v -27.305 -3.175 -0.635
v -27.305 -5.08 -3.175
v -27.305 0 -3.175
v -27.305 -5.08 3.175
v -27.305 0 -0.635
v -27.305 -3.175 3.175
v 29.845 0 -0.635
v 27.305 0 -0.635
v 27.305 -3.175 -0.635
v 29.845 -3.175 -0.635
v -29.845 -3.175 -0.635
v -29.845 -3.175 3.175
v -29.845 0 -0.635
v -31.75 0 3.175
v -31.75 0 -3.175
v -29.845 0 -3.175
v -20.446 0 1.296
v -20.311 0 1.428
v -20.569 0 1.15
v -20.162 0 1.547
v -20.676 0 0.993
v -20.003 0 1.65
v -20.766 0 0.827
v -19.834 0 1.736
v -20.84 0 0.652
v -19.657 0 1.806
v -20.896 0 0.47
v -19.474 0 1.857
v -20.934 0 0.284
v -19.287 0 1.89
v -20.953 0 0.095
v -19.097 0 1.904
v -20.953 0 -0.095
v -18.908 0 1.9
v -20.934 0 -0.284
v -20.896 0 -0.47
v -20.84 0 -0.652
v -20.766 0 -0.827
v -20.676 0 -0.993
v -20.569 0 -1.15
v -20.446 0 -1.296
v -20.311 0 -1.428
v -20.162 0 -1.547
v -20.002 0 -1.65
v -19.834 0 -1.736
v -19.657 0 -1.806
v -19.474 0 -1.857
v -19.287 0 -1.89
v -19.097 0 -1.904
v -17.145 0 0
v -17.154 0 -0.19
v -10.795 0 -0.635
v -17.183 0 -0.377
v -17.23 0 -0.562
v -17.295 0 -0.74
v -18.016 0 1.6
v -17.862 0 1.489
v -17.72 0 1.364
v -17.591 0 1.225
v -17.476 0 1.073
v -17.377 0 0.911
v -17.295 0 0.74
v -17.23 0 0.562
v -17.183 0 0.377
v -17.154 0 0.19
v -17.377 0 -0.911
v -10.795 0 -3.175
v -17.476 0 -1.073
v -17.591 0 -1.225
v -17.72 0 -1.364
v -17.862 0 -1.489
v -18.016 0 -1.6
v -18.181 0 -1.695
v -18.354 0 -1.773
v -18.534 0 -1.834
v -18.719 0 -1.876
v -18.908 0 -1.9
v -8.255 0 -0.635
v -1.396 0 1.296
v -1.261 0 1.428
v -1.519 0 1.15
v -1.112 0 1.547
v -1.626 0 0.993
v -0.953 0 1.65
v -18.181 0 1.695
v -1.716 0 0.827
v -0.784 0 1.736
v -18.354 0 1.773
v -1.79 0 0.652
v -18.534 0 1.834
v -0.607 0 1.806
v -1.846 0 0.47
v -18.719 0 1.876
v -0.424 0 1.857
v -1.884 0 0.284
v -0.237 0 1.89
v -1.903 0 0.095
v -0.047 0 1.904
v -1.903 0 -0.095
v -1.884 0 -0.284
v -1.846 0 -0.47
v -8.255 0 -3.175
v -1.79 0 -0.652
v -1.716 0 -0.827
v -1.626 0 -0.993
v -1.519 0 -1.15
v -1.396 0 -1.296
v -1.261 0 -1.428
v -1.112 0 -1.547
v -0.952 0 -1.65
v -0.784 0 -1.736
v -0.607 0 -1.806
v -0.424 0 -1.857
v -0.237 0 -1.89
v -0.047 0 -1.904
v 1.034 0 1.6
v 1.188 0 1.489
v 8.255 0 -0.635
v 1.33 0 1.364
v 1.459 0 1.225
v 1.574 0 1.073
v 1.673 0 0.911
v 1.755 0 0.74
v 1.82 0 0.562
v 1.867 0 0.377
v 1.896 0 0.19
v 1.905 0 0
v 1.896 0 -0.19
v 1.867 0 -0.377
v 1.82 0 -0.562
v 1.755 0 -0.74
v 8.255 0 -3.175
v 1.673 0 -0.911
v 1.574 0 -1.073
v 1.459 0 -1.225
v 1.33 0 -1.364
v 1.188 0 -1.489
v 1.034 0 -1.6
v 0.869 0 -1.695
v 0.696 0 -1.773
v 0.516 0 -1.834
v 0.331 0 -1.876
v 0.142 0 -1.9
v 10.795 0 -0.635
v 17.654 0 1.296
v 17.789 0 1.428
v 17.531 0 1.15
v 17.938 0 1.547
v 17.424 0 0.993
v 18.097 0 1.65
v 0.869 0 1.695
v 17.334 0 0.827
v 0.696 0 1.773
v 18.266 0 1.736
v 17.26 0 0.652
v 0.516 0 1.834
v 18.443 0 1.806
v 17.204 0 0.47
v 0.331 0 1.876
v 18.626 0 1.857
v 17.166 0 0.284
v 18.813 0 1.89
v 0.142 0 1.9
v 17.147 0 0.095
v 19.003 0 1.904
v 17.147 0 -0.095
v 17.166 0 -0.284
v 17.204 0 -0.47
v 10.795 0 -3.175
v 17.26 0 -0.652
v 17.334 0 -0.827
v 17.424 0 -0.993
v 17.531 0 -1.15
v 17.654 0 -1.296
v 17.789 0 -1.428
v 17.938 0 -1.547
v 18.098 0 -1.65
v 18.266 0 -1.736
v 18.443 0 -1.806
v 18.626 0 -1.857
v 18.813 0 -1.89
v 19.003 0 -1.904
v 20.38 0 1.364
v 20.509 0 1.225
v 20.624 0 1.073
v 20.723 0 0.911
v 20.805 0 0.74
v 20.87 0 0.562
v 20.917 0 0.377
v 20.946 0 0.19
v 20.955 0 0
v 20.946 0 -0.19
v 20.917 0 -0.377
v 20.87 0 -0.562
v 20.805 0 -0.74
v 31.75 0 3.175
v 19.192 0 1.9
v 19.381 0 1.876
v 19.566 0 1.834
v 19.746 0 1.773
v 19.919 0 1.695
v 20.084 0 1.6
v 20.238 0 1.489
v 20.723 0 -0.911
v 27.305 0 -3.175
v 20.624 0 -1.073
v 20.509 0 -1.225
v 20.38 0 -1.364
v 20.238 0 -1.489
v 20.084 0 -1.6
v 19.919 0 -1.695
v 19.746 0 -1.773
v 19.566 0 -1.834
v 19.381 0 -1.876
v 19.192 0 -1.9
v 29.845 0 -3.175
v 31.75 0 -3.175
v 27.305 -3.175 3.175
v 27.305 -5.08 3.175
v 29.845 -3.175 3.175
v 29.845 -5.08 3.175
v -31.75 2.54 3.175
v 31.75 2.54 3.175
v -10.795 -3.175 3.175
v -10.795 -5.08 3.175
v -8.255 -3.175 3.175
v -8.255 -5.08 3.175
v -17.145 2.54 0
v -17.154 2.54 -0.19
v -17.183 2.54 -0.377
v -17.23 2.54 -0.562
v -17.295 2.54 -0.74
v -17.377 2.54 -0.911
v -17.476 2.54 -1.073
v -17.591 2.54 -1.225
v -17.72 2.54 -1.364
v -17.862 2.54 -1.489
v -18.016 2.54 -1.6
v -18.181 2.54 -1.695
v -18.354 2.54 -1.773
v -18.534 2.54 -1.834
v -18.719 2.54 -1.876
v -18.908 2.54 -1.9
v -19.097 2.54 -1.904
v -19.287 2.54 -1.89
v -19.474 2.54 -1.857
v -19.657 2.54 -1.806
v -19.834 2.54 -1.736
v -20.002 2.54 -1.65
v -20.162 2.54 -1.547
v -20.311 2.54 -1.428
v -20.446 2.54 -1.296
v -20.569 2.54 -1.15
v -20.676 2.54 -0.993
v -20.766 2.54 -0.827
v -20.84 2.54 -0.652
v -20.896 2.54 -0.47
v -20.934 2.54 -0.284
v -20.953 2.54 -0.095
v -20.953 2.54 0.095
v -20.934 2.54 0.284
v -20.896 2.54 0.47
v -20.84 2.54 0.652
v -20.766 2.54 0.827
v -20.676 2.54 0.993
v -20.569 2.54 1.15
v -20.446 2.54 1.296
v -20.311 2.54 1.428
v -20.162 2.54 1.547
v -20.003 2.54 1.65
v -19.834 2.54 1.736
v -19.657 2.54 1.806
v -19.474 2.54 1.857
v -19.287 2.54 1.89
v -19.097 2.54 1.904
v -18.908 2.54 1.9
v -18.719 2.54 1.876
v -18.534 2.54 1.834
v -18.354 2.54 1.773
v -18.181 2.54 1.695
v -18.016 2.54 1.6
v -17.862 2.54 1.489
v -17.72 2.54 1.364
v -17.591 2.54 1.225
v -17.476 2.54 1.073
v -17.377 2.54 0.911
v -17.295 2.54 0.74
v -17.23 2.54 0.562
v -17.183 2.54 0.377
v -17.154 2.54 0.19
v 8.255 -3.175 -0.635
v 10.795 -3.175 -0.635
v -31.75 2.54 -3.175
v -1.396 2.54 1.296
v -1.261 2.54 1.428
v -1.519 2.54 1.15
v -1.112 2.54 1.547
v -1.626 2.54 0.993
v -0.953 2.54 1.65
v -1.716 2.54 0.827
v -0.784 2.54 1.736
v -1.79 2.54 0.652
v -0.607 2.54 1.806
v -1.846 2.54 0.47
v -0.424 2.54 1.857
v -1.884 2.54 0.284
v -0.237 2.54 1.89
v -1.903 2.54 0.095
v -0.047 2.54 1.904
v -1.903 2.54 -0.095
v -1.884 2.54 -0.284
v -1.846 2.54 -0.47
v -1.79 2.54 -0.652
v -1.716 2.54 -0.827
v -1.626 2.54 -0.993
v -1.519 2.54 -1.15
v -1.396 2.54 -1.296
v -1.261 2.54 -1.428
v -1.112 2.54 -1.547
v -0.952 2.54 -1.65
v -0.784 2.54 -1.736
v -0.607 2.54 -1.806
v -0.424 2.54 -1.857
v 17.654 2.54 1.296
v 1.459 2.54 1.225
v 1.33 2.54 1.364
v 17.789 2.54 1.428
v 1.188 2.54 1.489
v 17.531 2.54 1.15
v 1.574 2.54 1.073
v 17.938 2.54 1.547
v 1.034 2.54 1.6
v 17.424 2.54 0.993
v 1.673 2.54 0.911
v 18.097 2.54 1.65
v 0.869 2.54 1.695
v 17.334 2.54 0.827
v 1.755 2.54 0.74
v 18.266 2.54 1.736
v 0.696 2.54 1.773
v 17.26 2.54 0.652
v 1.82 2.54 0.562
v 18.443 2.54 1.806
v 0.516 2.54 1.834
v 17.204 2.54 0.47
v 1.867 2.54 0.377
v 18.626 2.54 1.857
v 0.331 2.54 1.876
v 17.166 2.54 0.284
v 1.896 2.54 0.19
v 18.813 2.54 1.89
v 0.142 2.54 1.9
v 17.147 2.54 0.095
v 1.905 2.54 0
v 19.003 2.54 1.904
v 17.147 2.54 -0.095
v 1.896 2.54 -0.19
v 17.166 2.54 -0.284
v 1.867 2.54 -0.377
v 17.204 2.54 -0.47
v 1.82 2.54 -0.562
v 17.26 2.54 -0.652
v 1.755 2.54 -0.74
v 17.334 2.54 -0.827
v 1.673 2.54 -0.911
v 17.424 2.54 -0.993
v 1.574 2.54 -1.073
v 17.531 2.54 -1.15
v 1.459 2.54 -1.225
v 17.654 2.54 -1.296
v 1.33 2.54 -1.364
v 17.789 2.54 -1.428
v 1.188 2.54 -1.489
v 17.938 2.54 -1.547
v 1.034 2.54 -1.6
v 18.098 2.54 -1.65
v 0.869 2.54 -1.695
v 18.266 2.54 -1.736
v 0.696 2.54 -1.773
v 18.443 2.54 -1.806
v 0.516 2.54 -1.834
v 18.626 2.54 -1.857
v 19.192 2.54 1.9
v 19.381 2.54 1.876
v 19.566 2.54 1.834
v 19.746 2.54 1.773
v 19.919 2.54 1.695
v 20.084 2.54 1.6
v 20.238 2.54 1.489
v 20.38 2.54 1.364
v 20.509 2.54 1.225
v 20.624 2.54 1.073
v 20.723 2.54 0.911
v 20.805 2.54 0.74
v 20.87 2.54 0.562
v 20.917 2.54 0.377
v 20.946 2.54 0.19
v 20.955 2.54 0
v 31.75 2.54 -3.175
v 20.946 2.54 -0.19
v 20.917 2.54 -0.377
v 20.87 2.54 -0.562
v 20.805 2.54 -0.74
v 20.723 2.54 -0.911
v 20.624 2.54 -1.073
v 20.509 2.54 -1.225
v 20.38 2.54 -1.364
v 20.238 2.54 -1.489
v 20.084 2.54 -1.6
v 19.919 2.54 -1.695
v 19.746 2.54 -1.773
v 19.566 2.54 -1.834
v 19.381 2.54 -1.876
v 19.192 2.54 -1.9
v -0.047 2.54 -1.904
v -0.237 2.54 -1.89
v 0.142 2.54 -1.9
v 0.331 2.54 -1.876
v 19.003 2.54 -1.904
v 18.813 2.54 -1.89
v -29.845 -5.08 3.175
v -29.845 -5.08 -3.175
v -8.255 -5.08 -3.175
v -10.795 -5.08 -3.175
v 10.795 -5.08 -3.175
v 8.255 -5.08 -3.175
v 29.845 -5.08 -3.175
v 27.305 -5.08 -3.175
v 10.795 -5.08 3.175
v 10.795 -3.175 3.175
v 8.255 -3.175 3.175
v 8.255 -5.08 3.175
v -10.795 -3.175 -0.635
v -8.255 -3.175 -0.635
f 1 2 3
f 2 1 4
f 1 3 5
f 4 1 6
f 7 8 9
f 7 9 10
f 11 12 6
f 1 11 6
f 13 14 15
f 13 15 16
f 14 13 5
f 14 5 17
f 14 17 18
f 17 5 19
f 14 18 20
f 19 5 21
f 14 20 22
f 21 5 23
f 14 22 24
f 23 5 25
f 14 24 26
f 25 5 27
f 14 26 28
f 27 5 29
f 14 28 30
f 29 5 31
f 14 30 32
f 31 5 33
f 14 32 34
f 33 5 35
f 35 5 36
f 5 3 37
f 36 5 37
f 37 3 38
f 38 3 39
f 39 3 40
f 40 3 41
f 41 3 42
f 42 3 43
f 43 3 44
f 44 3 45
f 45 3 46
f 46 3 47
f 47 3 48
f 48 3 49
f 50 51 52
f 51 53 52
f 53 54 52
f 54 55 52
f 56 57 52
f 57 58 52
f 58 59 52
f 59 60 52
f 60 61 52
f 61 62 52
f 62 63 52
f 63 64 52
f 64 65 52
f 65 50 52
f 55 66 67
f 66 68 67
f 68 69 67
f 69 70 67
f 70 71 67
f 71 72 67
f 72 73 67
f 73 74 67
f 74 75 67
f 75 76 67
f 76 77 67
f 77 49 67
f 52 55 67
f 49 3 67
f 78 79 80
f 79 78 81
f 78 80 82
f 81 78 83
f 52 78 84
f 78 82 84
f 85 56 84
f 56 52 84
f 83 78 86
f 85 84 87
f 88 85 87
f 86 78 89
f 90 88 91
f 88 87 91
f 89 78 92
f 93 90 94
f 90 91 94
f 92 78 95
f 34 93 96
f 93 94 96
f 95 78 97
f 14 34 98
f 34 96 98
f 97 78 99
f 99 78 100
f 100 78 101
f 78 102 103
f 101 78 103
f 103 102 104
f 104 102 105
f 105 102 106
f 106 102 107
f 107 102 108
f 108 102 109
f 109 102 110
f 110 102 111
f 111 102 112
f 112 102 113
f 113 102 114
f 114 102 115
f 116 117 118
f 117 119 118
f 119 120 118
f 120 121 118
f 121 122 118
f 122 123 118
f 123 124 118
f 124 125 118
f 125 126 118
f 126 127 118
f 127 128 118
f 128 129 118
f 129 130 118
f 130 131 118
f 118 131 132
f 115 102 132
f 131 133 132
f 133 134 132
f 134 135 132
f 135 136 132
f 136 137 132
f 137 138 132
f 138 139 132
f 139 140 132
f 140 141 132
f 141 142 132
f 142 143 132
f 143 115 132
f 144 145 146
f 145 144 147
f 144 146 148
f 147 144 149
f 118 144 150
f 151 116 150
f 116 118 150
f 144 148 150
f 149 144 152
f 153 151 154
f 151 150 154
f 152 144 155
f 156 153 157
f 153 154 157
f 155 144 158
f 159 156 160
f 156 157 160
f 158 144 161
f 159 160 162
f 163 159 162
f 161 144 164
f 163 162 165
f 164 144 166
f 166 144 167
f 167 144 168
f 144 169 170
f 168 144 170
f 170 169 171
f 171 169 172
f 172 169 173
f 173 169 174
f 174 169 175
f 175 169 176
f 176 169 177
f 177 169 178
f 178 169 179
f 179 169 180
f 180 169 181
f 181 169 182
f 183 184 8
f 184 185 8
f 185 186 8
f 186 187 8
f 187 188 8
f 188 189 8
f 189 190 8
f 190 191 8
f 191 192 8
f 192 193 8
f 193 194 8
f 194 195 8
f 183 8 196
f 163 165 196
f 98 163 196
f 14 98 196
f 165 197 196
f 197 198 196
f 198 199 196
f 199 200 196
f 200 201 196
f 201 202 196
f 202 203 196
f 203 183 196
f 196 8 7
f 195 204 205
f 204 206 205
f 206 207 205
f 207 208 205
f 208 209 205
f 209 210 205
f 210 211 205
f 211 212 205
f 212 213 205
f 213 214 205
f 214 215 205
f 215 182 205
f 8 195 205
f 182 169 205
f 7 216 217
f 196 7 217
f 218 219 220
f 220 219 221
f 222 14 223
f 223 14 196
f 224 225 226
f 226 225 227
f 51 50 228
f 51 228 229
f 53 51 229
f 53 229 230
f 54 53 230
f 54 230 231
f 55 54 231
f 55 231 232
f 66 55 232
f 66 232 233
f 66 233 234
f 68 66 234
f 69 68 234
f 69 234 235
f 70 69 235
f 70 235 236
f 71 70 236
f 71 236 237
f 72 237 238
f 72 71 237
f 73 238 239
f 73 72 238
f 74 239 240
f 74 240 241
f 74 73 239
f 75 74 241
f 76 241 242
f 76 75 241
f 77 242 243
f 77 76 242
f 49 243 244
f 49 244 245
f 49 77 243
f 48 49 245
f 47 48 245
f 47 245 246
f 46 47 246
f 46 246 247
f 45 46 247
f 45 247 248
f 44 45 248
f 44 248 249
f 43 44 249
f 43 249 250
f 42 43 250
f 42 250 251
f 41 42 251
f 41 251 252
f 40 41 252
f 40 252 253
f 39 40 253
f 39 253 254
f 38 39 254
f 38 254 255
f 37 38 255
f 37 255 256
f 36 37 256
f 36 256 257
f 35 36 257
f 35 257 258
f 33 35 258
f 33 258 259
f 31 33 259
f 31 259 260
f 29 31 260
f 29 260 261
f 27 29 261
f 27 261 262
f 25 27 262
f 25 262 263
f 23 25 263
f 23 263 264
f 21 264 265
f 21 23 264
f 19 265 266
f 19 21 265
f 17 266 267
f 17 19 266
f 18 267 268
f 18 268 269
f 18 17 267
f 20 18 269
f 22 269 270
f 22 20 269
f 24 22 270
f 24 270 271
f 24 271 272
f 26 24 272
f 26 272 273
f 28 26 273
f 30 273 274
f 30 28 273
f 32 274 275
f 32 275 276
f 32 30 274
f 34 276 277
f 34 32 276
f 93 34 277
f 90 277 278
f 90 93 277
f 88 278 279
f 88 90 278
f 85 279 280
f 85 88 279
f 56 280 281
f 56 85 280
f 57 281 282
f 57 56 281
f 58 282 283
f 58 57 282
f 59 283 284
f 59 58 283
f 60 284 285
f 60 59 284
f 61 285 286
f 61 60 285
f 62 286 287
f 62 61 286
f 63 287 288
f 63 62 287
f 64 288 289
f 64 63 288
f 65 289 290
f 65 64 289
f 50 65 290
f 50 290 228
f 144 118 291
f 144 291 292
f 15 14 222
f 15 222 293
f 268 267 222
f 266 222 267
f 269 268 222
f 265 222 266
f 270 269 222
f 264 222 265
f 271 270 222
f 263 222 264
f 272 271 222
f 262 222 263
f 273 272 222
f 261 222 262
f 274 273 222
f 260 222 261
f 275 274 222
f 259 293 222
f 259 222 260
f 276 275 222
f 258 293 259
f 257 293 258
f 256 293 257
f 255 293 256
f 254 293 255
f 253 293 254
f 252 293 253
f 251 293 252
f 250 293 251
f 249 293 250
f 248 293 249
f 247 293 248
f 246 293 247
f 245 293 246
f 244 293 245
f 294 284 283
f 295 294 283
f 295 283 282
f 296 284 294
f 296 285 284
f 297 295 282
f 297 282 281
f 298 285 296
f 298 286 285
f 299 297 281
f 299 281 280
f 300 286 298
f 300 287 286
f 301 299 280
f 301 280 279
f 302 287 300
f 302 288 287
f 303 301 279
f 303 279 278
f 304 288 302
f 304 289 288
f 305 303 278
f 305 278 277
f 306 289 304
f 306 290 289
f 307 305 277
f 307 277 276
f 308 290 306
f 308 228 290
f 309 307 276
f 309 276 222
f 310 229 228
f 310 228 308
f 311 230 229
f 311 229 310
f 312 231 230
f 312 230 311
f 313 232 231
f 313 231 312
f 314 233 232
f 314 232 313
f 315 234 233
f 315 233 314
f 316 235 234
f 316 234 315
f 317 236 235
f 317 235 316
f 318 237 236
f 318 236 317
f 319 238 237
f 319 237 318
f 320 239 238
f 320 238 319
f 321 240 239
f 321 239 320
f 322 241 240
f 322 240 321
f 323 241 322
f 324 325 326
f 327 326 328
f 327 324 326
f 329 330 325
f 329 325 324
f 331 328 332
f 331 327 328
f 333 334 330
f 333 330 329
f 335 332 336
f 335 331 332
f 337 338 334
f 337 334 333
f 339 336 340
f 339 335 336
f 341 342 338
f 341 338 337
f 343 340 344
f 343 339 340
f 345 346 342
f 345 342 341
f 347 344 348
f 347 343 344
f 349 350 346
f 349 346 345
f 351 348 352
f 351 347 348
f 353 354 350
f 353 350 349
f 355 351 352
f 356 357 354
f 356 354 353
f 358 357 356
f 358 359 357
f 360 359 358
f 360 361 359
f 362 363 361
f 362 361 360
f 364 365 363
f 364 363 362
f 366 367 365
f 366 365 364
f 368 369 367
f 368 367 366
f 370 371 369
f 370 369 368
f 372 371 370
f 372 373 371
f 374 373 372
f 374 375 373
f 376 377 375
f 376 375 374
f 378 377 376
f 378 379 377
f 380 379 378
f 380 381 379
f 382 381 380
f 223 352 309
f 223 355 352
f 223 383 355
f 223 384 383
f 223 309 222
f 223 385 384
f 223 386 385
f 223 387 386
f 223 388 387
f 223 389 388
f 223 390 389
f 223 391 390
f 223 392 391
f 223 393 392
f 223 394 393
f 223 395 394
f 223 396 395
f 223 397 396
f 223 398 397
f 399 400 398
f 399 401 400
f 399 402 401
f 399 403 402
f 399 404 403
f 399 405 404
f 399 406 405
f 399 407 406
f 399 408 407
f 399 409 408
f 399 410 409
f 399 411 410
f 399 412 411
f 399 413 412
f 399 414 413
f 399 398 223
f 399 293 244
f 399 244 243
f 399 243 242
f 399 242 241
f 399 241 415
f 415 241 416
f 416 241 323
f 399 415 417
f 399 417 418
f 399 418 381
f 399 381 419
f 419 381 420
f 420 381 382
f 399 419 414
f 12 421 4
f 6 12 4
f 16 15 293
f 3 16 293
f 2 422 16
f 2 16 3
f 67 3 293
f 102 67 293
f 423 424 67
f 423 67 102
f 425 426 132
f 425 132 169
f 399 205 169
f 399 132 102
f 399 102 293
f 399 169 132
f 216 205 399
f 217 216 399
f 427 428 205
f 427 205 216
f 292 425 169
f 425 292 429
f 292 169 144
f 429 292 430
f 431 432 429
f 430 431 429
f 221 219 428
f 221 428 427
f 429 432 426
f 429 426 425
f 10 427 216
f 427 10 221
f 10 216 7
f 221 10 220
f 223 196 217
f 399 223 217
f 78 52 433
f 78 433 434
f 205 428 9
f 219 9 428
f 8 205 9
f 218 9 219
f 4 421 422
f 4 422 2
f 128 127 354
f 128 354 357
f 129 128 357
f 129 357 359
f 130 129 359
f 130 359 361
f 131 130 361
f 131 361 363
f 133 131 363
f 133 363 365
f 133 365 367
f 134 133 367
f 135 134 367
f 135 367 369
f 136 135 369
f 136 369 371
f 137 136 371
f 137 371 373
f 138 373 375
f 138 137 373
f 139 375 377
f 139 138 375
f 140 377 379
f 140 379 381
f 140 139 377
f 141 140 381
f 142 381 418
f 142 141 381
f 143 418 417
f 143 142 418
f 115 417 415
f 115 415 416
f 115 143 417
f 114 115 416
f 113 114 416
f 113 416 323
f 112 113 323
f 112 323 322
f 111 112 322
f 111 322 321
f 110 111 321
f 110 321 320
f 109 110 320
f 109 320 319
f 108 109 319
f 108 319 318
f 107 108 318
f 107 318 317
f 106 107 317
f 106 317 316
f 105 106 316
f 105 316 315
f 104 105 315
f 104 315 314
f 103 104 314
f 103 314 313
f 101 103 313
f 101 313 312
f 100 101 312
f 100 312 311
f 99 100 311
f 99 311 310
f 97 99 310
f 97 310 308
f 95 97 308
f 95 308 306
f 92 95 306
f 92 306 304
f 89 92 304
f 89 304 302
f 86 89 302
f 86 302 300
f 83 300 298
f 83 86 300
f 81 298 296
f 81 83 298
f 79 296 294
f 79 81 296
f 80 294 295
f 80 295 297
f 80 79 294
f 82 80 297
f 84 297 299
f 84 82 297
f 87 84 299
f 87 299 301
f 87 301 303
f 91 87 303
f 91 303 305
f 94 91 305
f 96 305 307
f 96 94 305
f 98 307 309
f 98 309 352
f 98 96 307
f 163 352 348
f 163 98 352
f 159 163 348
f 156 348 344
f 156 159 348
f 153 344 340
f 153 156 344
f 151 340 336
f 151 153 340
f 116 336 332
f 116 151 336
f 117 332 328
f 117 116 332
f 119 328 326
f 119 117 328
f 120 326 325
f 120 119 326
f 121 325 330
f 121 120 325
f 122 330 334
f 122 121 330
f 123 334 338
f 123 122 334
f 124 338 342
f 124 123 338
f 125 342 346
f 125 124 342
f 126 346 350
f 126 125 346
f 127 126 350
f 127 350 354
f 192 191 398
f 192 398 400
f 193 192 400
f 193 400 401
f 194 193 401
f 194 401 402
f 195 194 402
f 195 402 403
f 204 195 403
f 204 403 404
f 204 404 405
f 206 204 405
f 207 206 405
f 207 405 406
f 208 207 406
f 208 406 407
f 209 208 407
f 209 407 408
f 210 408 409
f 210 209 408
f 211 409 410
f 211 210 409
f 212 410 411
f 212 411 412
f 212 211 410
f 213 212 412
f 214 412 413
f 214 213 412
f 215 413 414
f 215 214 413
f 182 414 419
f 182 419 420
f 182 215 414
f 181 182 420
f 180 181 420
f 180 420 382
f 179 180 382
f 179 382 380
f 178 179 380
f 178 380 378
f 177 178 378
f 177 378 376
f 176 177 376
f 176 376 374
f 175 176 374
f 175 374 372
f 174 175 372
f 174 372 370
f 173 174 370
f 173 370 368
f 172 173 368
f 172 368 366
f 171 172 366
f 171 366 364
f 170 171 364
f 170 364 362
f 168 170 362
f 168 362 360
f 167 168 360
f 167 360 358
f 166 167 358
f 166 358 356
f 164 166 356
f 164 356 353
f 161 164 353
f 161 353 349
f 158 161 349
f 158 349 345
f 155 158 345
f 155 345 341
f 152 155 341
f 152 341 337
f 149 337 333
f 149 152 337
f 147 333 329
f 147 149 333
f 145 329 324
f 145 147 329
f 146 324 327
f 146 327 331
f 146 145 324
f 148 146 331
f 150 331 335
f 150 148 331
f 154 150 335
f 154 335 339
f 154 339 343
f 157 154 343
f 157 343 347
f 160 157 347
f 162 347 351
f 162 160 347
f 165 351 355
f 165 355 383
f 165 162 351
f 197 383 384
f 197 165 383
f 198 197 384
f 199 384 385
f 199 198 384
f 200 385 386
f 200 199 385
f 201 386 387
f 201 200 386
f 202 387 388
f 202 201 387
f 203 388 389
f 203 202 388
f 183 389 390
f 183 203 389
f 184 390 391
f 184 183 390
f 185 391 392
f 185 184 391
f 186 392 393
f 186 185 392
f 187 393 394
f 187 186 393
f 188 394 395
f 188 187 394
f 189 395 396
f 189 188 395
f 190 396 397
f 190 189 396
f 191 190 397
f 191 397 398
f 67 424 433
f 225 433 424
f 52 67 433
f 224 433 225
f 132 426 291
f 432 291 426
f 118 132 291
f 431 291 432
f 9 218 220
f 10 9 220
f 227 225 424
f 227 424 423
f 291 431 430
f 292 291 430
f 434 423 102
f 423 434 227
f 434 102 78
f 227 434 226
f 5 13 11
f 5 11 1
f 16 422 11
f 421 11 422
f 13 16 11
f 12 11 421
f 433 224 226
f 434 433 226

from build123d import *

# Parameters (mm, degrees)
SKETCH1_W           = 63.5
SKETCH1_H           = 6.35
SKETCH1_R           = 1.905
BOSS_EXTRUDE1_DEPTH = 2.54
SKETCH2_W           = 2.54
SKETCH2_H           = 6.35
BOSS_EXTRUDE2_DEPTH = 5.08
SKETCH3_W           = 63.5
SKETCH3_H           = 3.175
CUT_EXTRUDE1_DEPTH  = 3.81


with BuildPart() as part:
    # Sketch1 → Boss-Extrude1 (new body)
    with BuildSketch(Plane(origin=(0, 0, 0), x_dir=(1, 0, 0), z_dir=(0, 1, 0))):
        Rectangle(SKETCH1_W, SKETCH1_H)
        Circle(SKETCH1_R, mode=Mode.SUBTRACT)
        with Locations((-19.05, 0)):
            Circle(SKETCH1_R, mode=Mode.SUBTRACT)
        with Locations((19.05, 0)):
            Circle(SKETCH1_R, mode=Mode.SUBTRACT)
    extrude(amount=BOSS_EXTRUDE1_DEPTH)

    # Sketch2 → Boss-Extrude2 (add)
    with BuildSketch(Plane.XZ):
        with Locations((-9.525, 0)):
            Rectangle(SKETCH2_W, SKETCH2_H)
        with Locations((-28.575, 0)):
            Rectangle(SKETCH2_W, SKETCH2_H)
        with Locations((9.525, 0)):
            Rectangle(SKETCH2_W, SKETCH2_H)
        with Locations((28.575, 0)):
            Rectangle(SKETCH2_W, SKETCH2_H)
    extrude(amount=BOSS_EXTRUDE2_DEPTH)

    # Sketch3 → Cut-Extrude1 (cut)
    with BuildSketch(Plane.XY.offset(3.175)):
        with Locations((0, -1.5875)):
            Rectangle(SKETCH3_W, SKETCH3_H)
    extrude(amount=-CUT_EXTRUDE1_DEPTH, mode=Mode.SUBTRACT)


solid = part.part
